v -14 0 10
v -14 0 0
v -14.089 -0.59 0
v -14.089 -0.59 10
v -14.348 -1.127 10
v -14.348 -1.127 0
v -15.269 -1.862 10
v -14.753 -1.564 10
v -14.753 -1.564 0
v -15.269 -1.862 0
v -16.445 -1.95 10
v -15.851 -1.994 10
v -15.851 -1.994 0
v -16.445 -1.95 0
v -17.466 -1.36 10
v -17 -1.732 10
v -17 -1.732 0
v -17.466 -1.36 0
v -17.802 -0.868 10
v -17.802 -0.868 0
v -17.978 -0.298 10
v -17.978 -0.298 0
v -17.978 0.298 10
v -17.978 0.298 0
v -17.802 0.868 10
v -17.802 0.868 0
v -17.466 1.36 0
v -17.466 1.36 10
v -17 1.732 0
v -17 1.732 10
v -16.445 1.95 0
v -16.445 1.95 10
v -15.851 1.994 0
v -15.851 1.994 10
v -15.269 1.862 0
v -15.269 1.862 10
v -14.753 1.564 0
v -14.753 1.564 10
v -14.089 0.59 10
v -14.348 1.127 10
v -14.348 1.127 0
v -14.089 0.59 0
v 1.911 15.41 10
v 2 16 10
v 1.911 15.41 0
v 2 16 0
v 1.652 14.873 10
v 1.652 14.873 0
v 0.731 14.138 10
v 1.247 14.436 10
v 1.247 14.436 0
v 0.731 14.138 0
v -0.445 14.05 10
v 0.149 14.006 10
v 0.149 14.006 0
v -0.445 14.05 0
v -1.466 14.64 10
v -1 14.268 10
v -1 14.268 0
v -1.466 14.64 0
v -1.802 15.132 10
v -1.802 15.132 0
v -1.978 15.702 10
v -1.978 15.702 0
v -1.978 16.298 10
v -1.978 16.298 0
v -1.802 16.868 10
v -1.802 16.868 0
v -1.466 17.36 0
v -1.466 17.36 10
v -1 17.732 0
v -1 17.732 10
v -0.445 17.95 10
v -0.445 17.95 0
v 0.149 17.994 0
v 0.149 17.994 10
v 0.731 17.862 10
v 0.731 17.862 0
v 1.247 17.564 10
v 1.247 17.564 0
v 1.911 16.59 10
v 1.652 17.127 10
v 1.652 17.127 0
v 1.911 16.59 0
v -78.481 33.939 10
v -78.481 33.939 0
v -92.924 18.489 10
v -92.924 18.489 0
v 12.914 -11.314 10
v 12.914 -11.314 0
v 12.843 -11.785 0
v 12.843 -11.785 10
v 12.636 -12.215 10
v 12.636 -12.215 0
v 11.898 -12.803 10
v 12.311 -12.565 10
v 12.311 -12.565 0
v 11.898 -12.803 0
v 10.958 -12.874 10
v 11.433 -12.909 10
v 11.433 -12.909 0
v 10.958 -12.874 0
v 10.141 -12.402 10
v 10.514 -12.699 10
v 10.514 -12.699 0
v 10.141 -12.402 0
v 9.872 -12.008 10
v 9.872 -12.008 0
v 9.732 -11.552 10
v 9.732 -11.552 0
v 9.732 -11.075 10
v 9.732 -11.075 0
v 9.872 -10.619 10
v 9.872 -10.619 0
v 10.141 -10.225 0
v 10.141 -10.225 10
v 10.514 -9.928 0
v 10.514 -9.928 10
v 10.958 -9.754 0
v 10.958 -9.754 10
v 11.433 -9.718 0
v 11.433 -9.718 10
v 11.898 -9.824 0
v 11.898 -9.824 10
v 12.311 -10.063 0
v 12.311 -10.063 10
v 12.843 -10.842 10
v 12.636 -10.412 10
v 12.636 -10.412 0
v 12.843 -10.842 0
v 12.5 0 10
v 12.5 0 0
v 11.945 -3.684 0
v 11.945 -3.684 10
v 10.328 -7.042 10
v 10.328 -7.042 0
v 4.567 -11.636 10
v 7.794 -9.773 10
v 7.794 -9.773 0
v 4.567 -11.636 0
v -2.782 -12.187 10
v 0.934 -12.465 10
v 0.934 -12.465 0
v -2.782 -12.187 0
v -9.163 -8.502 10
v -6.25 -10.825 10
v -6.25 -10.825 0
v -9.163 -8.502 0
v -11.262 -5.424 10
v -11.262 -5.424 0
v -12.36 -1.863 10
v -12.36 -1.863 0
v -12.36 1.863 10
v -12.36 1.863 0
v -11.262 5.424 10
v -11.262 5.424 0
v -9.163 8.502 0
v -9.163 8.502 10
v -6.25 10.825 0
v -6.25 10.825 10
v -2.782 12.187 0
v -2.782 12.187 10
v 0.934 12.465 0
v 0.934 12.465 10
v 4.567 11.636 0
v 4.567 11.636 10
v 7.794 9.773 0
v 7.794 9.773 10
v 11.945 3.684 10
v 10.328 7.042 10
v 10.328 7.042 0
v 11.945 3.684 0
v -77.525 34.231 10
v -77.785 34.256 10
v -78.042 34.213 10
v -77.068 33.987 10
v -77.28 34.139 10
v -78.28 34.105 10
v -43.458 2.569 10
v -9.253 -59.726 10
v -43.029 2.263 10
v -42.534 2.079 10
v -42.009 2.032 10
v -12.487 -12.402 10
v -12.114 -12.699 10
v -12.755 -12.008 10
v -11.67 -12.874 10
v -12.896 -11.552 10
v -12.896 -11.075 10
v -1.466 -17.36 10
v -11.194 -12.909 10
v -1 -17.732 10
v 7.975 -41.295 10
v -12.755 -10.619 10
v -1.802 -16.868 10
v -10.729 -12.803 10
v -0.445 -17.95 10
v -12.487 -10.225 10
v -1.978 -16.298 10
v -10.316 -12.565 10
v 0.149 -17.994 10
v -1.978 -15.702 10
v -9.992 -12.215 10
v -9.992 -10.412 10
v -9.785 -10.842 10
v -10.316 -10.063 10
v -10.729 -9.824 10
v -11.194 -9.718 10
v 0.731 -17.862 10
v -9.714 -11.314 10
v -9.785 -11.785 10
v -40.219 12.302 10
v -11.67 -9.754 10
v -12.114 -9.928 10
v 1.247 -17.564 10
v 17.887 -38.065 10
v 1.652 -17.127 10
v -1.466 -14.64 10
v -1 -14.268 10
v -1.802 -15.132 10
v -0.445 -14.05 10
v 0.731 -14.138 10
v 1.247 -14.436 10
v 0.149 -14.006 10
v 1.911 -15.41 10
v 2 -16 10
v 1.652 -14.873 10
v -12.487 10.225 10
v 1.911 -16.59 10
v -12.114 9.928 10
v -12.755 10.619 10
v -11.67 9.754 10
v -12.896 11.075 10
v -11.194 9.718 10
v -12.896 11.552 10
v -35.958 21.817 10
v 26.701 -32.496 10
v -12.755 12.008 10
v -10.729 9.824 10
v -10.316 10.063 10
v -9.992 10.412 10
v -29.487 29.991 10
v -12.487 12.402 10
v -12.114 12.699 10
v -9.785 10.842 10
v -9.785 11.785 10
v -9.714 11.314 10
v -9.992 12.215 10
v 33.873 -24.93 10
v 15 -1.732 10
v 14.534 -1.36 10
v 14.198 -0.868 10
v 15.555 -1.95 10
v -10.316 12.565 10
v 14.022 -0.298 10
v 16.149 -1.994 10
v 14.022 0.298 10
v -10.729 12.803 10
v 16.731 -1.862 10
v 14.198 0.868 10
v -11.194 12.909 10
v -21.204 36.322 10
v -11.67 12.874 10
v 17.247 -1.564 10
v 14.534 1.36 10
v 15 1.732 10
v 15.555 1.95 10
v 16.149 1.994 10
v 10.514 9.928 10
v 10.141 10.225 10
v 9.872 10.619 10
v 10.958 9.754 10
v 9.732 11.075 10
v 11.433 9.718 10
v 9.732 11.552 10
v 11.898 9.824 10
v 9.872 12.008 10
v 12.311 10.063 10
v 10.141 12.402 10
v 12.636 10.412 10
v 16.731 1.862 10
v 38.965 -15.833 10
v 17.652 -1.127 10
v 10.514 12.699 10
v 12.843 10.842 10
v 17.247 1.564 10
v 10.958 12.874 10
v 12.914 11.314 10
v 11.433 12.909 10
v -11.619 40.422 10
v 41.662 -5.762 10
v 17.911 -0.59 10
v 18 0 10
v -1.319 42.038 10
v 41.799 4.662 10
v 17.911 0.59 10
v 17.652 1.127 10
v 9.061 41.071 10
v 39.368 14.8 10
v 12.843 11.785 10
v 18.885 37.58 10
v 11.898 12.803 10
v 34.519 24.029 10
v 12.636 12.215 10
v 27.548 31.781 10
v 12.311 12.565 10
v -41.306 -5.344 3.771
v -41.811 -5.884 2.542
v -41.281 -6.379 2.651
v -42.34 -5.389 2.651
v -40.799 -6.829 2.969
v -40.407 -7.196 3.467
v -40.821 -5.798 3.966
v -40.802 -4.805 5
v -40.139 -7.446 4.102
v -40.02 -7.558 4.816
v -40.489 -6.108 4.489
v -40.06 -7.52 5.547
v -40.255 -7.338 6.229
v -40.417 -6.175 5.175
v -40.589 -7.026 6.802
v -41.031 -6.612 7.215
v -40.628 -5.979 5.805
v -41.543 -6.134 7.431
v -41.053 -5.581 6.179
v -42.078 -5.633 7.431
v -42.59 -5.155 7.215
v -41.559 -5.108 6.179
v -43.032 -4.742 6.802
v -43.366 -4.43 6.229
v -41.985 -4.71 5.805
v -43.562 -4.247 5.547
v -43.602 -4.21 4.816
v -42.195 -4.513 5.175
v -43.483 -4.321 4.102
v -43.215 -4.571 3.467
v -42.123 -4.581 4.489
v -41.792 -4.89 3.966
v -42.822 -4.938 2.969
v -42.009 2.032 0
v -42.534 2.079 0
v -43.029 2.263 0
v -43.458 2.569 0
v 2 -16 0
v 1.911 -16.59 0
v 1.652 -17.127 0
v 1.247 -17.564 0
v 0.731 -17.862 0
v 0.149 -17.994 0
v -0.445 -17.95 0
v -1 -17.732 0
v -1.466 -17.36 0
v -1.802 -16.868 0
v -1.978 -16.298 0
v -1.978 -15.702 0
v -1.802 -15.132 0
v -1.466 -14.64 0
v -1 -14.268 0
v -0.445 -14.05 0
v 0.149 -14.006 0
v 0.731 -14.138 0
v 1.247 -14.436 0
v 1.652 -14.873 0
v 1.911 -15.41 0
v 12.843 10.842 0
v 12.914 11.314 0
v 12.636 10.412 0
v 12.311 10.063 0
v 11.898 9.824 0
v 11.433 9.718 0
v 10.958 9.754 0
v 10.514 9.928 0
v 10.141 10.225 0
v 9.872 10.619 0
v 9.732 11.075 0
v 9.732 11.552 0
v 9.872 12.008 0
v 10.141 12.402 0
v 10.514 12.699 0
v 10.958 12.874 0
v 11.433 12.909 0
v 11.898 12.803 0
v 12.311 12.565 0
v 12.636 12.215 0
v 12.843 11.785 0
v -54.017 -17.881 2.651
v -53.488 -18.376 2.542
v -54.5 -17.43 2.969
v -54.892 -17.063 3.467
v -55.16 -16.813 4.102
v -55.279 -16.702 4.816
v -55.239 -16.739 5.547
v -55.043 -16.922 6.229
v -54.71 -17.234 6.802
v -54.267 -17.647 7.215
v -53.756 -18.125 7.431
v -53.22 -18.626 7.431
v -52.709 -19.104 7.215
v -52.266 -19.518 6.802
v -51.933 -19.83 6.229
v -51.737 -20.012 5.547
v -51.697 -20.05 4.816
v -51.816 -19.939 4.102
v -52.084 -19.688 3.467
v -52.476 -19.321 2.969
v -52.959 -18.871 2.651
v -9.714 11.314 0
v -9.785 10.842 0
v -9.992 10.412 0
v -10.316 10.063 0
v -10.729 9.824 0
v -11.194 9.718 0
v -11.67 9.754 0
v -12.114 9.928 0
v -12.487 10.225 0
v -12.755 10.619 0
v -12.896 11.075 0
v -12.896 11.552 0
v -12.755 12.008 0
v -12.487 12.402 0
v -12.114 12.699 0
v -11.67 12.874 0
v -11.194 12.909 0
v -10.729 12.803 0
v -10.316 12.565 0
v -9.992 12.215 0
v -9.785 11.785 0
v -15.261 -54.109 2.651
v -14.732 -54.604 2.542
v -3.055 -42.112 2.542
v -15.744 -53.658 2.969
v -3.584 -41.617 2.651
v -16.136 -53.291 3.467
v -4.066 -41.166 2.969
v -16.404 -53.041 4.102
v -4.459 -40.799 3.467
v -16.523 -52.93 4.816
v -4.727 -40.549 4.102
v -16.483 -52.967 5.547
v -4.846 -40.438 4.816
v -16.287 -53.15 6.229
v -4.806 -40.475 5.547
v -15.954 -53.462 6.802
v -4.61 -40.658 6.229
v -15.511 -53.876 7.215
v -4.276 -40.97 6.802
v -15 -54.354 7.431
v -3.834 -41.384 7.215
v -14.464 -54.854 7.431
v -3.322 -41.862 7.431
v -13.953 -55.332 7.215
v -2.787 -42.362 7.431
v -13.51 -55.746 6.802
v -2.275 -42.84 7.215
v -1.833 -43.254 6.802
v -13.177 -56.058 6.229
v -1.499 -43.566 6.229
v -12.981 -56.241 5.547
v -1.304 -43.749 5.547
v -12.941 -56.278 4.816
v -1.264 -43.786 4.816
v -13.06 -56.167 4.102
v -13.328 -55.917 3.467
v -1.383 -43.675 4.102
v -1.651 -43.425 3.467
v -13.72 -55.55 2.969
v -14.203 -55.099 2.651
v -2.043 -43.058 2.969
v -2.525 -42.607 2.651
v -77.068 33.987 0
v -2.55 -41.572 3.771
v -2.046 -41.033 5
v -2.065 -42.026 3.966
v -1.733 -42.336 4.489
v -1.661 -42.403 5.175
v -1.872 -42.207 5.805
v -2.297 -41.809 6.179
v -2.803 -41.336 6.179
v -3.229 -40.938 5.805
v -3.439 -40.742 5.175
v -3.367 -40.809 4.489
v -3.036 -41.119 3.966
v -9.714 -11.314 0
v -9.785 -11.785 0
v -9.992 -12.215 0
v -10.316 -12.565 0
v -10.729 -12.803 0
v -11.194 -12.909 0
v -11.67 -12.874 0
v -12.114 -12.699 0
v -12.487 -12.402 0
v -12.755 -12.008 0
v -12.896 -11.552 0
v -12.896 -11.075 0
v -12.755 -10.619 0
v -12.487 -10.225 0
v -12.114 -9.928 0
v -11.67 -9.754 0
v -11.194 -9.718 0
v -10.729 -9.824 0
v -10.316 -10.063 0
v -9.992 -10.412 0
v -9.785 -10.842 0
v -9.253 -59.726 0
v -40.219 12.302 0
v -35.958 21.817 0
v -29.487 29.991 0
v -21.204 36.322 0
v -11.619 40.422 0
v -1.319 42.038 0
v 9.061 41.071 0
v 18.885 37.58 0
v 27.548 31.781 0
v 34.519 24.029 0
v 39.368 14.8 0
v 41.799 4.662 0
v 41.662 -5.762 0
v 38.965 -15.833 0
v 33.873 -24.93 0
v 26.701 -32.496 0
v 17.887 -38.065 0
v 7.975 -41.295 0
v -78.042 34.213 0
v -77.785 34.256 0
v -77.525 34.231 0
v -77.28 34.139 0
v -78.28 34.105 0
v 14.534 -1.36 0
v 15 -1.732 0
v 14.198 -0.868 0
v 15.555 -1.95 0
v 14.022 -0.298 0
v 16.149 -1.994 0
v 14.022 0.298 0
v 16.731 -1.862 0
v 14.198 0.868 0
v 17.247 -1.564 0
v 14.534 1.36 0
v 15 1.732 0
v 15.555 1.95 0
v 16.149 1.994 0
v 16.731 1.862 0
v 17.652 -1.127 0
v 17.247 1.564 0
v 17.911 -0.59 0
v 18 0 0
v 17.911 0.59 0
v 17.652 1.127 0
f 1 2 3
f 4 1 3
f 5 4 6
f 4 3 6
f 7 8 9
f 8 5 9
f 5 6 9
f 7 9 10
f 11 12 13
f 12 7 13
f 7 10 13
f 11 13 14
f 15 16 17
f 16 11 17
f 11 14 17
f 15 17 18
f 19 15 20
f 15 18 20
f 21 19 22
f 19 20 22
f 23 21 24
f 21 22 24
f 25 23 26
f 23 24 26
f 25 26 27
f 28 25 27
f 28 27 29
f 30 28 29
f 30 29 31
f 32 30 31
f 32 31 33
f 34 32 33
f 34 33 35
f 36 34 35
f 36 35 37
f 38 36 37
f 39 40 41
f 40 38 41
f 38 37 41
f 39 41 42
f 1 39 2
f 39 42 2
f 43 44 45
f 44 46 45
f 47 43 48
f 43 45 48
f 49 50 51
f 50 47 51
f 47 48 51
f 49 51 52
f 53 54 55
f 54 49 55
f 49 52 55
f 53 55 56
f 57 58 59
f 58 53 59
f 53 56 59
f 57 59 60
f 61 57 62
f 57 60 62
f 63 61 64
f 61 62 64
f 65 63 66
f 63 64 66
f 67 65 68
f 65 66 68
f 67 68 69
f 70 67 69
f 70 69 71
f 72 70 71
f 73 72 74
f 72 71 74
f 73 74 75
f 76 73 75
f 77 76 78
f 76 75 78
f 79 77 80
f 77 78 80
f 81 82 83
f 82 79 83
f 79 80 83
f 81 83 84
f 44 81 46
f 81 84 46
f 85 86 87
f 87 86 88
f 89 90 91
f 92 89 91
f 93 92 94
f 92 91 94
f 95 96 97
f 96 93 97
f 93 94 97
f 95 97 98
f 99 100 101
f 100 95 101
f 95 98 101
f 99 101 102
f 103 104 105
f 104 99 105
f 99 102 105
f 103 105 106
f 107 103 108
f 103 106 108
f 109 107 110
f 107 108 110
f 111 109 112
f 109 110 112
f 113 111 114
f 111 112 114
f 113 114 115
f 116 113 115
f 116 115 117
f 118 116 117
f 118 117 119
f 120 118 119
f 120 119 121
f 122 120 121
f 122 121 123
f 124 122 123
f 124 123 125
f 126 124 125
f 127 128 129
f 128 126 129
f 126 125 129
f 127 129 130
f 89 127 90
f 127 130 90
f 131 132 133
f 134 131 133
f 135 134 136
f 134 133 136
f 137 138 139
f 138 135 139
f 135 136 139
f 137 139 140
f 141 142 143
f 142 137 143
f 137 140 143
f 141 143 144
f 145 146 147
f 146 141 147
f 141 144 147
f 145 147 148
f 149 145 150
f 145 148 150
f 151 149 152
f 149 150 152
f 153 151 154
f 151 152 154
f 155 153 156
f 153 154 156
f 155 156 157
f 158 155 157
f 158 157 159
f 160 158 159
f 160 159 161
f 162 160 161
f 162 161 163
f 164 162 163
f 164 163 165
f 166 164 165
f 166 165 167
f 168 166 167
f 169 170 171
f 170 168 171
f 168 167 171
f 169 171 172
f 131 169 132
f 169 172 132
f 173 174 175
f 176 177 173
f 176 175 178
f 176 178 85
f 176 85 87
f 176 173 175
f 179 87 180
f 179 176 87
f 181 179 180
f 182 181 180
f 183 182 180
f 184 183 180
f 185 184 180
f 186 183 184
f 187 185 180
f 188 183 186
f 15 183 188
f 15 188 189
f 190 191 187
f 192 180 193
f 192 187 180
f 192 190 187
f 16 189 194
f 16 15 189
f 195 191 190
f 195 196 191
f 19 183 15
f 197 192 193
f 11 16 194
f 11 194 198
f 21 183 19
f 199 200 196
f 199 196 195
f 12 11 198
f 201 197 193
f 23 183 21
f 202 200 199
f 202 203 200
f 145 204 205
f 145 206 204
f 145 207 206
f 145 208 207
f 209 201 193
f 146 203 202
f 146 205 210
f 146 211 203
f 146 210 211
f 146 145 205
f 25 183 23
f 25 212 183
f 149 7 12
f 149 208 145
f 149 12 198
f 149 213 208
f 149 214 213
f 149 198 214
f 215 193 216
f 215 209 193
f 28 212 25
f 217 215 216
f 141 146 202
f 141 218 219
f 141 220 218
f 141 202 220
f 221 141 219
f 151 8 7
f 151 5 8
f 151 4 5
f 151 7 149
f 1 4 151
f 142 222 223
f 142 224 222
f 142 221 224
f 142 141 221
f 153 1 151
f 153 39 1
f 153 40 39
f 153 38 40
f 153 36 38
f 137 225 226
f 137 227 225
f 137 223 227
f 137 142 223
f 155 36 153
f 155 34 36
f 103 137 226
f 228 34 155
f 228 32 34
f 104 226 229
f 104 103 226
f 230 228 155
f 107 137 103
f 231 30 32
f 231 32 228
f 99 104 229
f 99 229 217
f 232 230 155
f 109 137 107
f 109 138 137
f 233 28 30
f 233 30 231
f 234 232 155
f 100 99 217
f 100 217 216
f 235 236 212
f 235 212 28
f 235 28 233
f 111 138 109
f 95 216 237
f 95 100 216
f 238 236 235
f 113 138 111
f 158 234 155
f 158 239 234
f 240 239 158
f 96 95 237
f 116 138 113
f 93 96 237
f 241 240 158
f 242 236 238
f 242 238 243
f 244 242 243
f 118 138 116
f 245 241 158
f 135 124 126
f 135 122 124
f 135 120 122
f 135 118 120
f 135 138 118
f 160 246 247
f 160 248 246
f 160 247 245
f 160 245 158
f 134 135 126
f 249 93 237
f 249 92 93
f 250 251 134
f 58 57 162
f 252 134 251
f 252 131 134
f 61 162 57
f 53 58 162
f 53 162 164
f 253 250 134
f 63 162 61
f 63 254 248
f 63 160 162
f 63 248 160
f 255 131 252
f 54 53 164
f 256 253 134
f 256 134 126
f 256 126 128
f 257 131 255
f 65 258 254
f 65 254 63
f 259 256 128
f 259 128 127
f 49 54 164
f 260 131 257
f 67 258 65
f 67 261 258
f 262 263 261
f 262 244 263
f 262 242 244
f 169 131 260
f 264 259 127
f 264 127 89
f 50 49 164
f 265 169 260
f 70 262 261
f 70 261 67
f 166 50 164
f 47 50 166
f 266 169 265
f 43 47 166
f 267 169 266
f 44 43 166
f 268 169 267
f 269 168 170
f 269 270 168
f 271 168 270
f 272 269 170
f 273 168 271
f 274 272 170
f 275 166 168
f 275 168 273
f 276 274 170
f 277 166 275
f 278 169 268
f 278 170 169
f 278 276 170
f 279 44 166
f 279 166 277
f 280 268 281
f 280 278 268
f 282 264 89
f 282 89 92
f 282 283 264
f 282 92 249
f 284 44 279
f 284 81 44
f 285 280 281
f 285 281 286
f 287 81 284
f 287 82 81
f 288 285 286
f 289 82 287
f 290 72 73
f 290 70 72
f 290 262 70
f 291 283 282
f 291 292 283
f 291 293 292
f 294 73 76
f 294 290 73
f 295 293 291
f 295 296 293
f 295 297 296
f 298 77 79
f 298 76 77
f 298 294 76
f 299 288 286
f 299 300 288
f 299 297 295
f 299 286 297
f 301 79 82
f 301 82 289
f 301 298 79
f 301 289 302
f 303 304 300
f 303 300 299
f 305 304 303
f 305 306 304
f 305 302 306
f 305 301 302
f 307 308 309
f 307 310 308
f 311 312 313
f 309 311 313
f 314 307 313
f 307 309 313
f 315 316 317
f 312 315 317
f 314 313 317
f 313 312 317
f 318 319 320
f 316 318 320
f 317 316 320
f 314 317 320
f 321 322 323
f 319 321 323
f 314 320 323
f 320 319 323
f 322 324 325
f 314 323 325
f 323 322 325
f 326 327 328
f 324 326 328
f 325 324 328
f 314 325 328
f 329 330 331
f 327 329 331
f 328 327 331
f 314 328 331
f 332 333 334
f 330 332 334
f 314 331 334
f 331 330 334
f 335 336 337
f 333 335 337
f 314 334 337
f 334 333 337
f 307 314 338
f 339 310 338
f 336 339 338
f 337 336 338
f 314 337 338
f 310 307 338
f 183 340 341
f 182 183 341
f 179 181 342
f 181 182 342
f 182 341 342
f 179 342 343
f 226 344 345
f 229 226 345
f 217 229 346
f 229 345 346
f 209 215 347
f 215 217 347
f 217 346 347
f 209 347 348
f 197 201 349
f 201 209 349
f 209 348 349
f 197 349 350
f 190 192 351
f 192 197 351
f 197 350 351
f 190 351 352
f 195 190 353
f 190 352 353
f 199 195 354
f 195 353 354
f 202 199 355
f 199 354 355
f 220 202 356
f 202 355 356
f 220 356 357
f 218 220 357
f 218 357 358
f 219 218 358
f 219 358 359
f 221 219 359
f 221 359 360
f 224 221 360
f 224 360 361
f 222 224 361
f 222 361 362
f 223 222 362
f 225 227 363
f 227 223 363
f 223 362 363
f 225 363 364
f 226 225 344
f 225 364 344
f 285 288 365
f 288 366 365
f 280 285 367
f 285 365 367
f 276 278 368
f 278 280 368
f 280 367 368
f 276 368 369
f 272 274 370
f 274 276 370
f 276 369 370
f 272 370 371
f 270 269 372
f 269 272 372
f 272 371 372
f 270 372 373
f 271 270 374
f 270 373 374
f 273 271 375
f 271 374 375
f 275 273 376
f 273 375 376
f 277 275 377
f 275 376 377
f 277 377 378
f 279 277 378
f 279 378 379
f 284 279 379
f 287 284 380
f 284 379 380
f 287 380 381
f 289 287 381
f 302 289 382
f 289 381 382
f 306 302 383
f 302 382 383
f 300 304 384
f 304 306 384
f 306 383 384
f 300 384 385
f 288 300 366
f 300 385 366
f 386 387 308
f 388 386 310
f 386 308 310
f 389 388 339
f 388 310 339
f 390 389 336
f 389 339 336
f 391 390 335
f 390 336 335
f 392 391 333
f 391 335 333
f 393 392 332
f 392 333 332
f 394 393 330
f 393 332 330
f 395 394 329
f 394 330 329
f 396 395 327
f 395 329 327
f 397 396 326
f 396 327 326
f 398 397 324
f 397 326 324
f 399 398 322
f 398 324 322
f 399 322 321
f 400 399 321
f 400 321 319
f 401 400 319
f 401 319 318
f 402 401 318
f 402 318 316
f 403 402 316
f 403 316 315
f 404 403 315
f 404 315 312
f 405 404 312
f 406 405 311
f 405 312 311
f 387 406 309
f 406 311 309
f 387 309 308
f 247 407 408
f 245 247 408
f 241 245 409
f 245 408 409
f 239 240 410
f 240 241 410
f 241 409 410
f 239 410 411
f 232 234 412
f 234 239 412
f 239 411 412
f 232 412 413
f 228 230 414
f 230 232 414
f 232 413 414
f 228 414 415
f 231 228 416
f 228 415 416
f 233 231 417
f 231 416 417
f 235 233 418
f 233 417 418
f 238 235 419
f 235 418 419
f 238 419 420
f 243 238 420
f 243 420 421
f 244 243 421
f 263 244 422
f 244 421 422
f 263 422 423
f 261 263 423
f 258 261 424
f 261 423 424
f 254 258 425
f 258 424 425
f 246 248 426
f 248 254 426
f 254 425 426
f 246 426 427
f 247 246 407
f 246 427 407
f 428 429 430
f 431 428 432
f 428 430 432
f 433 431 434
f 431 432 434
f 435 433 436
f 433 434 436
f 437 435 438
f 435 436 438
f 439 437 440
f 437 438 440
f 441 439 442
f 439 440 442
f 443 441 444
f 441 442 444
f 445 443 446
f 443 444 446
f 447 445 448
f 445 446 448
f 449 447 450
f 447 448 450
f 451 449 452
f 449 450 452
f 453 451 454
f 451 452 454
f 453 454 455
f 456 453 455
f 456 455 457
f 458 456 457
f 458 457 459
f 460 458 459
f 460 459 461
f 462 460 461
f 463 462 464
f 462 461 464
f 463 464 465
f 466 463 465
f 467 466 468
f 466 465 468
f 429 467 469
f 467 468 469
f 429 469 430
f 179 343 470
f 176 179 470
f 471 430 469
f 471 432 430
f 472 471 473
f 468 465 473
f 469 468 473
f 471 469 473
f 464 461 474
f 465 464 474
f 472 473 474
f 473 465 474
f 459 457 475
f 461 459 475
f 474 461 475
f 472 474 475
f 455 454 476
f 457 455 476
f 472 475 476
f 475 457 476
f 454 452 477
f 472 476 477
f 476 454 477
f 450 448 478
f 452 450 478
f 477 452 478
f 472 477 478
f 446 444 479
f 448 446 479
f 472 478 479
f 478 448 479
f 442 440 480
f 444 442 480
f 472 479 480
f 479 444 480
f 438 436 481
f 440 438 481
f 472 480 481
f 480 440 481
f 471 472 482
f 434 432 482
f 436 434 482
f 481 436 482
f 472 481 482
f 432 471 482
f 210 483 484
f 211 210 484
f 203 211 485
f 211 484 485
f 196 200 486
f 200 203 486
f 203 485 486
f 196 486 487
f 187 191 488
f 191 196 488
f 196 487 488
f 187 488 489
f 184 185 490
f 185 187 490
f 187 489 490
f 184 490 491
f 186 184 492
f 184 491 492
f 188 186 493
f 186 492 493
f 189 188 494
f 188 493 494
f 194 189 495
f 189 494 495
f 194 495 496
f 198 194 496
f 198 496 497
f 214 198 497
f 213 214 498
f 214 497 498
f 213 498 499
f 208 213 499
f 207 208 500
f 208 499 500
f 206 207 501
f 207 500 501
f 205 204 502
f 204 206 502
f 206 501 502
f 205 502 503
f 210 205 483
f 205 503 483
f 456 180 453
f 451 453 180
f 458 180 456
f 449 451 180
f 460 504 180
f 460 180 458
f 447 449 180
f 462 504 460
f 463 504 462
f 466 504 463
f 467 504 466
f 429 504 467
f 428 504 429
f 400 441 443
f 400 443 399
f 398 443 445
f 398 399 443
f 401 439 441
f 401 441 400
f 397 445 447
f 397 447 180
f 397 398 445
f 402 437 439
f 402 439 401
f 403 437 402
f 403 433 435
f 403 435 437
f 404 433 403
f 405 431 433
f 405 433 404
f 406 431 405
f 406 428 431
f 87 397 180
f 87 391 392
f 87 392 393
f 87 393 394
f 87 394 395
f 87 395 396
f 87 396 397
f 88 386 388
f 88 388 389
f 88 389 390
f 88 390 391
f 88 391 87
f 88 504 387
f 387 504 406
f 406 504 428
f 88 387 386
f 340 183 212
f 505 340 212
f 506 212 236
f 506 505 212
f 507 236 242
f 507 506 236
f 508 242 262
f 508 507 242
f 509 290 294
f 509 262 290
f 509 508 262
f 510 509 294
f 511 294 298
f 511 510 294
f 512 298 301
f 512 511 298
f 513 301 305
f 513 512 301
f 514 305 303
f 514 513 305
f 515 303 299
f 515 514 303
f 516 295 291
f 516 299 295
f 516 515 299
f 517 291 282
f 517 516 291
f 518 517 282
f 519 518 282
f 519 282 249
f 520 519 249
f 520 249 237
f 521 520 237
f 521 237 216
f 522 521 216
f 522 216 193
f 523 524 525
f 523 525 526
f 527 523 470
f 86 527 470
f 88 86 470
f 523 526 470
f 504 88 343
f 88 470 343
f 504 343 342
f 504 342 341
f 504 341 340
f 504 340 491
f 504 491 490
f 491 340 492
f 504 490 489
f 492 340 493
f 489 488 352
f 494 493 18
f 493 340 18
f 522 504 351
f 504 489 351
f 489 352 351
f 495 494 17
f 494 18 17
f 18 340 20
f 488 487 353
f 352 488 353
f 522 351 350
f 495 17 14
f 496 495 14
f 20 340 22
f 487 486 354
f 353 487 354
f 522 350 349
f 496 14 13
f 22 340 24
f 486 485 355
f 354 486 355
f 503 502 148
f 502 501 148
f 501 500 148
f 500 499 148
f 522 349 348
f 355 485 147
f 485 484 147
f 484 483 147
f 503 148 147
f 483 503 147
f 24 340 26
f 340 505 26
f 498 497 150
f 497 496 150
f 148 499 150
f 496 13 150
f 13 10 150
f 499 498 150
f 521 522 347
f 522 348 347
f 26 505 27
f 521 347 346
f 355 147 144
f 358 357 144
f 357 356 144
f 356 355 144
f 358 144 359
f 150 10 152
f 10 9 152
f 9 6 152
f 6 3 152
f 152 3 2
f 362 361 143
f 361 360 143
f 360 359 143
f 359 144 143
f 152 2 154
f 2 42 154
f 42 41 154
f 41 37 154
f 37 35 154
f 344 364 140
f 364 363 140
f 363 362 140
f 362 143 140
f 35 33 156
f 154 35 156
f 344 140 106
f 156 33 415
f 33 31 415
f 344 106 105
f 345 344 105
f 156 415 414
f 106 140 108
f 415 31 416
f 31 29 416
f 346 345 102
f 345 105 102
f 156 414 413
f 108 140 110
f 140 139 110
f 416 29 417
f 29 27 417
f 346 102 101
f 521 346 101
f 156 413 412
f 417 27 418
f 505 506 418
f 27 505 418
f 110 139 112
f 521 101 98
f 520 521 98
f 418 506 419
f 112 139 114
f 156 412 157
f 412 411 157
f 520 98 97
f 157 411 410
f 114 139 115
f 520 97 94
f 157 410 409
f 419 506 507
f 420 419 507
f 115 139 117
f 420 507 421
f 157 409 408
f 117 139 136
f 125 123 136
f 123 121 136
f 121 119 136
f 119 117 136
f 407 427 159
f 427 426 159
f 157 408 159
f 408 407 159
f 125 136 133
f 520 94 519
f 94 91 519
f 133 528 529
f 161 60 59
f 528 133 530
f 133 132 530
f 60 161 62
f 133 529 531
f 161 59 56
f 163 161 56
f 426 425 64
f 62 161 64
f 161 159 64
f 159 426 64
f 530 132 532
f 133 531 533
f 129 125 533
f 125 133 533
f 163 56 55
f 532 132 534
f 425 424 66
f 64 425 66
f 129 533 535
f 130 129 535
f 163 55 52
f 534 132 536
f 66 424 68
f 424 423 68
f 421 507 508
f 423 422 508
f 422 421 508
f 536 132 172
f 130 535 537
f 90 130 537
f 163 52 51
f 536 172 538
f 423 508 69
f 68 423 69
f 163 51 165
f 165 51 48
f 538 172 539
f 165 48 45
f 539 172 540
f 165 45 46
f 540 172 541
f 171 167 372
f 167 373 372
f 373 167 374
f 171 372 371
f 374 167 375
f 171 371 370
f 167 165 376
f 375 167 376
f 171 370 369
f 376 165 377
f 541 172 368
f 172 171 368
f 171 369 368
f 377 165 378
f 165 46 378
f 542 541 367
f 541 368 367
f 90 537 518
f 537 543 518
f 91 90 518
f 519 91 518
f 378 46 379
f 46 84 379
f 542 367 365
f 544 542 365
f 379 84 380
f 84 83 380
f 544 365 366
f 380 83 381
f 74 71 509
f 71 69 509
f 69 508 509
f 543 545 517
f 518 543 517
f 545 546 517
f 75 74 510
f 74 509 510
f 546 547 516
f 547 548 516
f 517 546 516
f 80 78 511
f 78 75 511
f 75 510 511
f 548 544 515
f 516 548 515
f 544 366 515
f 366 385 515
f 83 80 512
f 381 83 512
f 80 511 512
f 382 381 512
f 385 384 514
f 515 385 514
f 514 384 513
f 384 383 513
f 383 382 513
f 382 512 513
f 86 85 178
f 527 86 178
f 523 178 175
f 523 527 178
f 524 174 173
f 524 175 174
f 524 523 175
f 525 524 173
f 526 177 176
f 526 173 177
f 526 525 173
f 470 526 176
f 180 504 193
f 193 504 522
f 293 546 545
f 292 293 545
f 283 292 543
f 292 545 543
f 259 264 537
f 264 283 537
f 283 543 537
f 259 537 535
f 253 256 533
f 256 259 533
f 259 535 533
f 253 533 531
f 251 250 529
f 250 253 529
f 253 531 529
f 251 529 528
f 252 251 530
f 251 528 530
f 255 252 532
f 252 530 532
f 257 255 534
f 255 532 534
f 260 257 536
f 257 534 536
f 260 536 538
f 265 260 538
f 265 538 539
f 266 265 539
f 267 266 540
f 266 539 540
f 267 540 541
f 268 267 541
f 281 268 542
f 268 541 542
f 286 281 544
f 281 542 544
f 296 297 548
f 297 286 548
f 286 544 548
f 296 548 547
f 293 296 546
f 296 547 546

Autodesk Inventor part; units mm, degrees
ref_plane "YZ Plane" through (0, 0, 0) normal (1, 0, 0) x (0, 1, 0)
ref_plane "XZ Plane" through (0, 0, 0) normal (0, 1, 0) x (-1, 0, 0)
ref_plane "Work Plane1" through (0, 0, 0) normal (0, 0, 1) x (1, 0, 0)
sketch "Sketch1" plane through (0, 0, 0) normal (0, 0, 1) x (1, 0, 0)
  circle A0 centre (0, 0) radius 12.5 projected
  circle A1 centre (0, -16) radius 2 projected
  circle A2 centre (0, 16) radius 2 projected
  circle A3 centre (-16, 0) radius 2 projected
  circle A4 centre (16, 0) radius 2 projected
  circle A5 centre (11.3137, 11.3137) radius 1.6 projected
  circle A6 centre (-11.3137, -11.3137) radius 1.6 projected
  circle A7 centre (-11.3137, 11.3137) radius 1.6 projected
  circle A8 centre (11.3137, -11.3137) radius 1.6 projected
  circle A9 centre (0, 0) radius 20.7 projected
  line L0 (31.6375, -97.9493) -> (-99.8575, 24.9697) projected
  line L1 (-23.1886, -46.699) -> (-9.2531, -59.7257) projected
  line L2 (15.1663, -37.3207) -> (23.5338, -32.6958) projected
  line L3 (34.2063, -21.2786) -> (38.2573, -12.6186) projected
  line L4 (40.1807, 2.8912) -> (38.3679, 12.2784) projected
  line L5 (30.8075, 25.9567) -> (23.8232, 32.4855) projected
  line L6 (9.6668, 39.1076) -> (0.1789, 40.2842) projected
  line L7 (-15.1663, 37.3207) -> (-23.5338, 32.6958) projected
  line L8 (-34.2063, 21.2786) -> (-38.2573, 12.6186) projected
  line L9 (-45.0314, -26.2807) -> (-35.471, -16.0534) projected
  line L10 (-28.404, -15.8151) -> (-13.8665, -29.4045) projected
  line L11 (-13.6283, -36.4716) -> (-23.1886, -46.699) projected
  circle A10 centre (33.3141, 1.123) radius 2.5 projected
  circle A11 centre (1.123, -33.3141) radius 2.5 projected
  circle A12 centre (0, 0) radius 21 projected
  circle A13 centre (-1.123, 33.3141) radius 2.5 projected
  circle A14 centre (-33.3141, -1.123) radius 2.5 projected
  arc A15 (-15.924, -38.9274) -> (-37.7667, -18.5092) centre (0, 0) ccw
  arc A16 (-28.404, -15.8151) -> (-35.471, -16.0534) centre (-31.8184, -19.4678) ccw
  arc A17 (-13.6283, -36.4716) -> (-13.8665, -29.4045) centre (-17.2809, -33.0572) ccw
  arc A18 (-77.068, 33.987) -> (-78.4814, 33.9394) centre (-77.7509, 33.2565) ccw projected
  line L12 (-78.4814, 33.9394) -> (-92.9244, 18.4887) projected
  line L13 (-92.9244, 18.4887) -> (-45.0314, -26.2807) projected
  arc A19 (-28.404, -15.8151) -> (-35.471, -16.0534) centre (-31.8184, -19.4678) ccw projected
  arc A20 (-13.6283, -36.4716) -> (-13.8665, -29.4045) centre (-17.2809, -33.0572) ccw projected
  line L14 (-9.2531, -59.7257) -> (9.7389, -39.4086) projected
  arc A21 (10.6702, -38.8458) -> (9.7389, -39.4086) centre (11.2, -40.7744) ccw projected
  arc A22 (10.6702, -38.8458) -> (15.1663, -37.3207) centre (0, 0) ccw projected
  arc A23 (23.5338, -32.6958) -> (34.2063, -21.2786) centre (0, 0) ccw projected
  arc A24 (38.2573, -12.6186) -> (40.1807, 2.8912) centre (0, 0) ccw projected
  arc A25 (38.3679, 12.2784) -> (30.8075, 25.9567) centre (0, 0) ccw projected
  arc A26 (23.8232, 32.4855) -> (9.6668, 39.1076) centre (0, 0) ccw projected
  arc A27 (0.1789, 40.2842) -> (-15.1663, 37.3207) centre (0, 0) ccw projected
  arc A28 (-23.5338, 32.6958) -> (-34.2063, 21.2786) centre (0, 0) ccw projected
  arc A29 (-38.2573, 12.6186) -> (-40.1013, 3.8394) centre (0, 0) ccw projected
  arc A30 (-43.4579, 2.5689) -> (-40.1013, 3.8394) centre (-42.0921, 4.03) ccw projected
  line L15 (-43.4579, 2.5689) -> (-77.068, 33.987) projected
  point P0 (0, 0)
  point P1 (7.9751, -41.2954)
  point P2 (36.8098, 20.3458)
  point P3 (-58.967, -13.254)
  point P4 (30.7249, -28.721)
  point P5 (30.7249, -28.721)
  point P6 (7.9751, -41.2954)
  point P7 (41.7388, -5.1762)
  point P8 (41.7388, -5.1762)
  point P9 (-41.7388, 5.1762)
  point P10 (-30.7249, 28.721)
  point P11 (-30.7249, 28.721)
  point P12 (17.8208, 38.0964)
  point P13 (17.8208, 38.0964)
  point P14 (-7.9751, 41.2954)
  point P15 (-7.9751, 41.2954)
  point P16 (7.9751, -41.2954)
  point P17 (-42.0094, 2.0317)
extrude "Extrusion1" add sketch "Sketch1" along normal blind 10 contours A9 | L0 L11 A15 L14 | L0 L9 A16 L10 A17 L11 | L14 A21 A22 L2 A23 L3 A24 L4 A25 L5 A26 L6 A27 L7 A28 L8 A29 A30 A15 | A15 L11 A17 L10 A16 L9 A30 A29 L8 A28 L7 A27 L6 A26 L5 A25 L4 A24 L3 A23 L2 A22 A21 L14 | L0 L12 A18 L15 A30 A15 L9 | A10 | A11 | A12 | A13 | A14
sketch "Sketch2" plane through (-45.0314, -26.2807, 0) normal (-0.6828833, -0.7305275, 0) x (0.7305275, -0.6828833, 0)
  line L0 (-65.5595, 0) -> (48.976, 0) projected
  line L1 (-65.5595, 10) -> (48.976, 10) projected
  line L2 (-65.5595, 0) -> (48.976, 0) projected
  line L3 (48.976, 0) -> (48.976, 10) projected
  line L4 (-65.5595, 10) -> (48.976, 10) projected
  line L5 (-65.5595, 0) -> (-65.5595, 10) projected
  line L6 (48.976, 0) -> (48.976, 10) projected
  line L7 (-65.5595, 0) -> (-65.5595, 10) projected
  point P0 (14.95, 0)
  point P1 (-11.576, 5)
  point P2 (41.476, 5)
  point P3 (-19.076, 5)
  point P4 (29.9, 5)
  point P5 (-8.2917, 10)
  dimension "d10" = 7.5
hole "Hole1" at (-53.488, -18.3757, 5) at (-14.732, -54.604, 5) direction (0.6828833, 0.7305275, 0) diameter 4.917 depth 17.1 tip angle 118 thread size "M6x1" class "6H" standard "ISO Metric profile"
sketch "Sketch3" plane through (0, 0, 10) normal (0, 0, 1) x (1, 0, 0)
  line L0 (-76.3375, 33.3041) -> (-73.606, 36.2263) projected
  line L1 (-48.5774, 7.3546) -> (-76.3375, 33.3041) projected
  line L2 (-45.8459, 10.2767) -> (-48.5774, 7.3546) projected
  line L3 (-45.8459, 10.2767) -> (-73.606, 36.2263) projected
  line L4 (-92.9244, 18.4887) -> (-9.2531, -59.7257) projected
  circle A0 centre (11.3137, -11.3137) radius 1.6 projected
  circle A1 centre (11.3137, 11.3137) radius 1.6 projected
  circle A2 centre (16, 0) radius 2 projected
  circle A3 centre (-16, 0) radius 2 projected
  circle A4 centre (-11.3137, -11.3137) radius 1.6 projected
  circle A5 centre (-11.3137, 11.3137) radius 1.6 projected
  circle A6 centre (0, 16) radius 2 projected
  circle A7 centre (0, -16) radius 2 projected
  circle A8 centre (0, 0) radius 12.5 projected
  line L5 (-41.7388, 5.1762) -> (-58.967, -13.254) projected
  line L6 (31.6375, -97.9493) -> (-99.8575, 24.9697) projected
  line L7 (-75.067, 37.592) -> (-92.9244, 18.4887)
  line L8 (-77.7985, 34.6699) -> (-47.1164, 5.9888)
  line L9 (-47.1164, 5.9888) -> (-43.8411, 2.9271)
  arc A9 (7.9751, -41.2954) -> (-42.0094, 2.0317) centre (0, 0) ccw projected
  arc A10 (-43.4579, 2.5689) -> (-42.0094, 2.0317) centre (-42.0921, 4.03) ccw projected
  line L10 (-43.4579, 2.5689) -> (-77.068, 33.987) projected
  arc A11 (-77.068, 33.987) -> (-78.4814, 33.9394) centre (-77.7509, 33.2565) ccw projected
  line L11 (-78.4814, 33.9394) -> (-92.9244, 18.4887) projected
  line L12 (-9.2531, -59.7257) -> (7.9751, -41.2954) projected
  point P0 (0, 0)
  point P1 (-44.3849, 8.9109)
  point P2 (-45.0314, -26.2807)
  point P3 (-23.1886, -46.699)
extrude "Extrusion2" [suppressed]
equation "\"d10\" = d9"
equation "\"d9\" = 7.5"
properties part number "gearboxFrame" material "Aluminum 6061"
